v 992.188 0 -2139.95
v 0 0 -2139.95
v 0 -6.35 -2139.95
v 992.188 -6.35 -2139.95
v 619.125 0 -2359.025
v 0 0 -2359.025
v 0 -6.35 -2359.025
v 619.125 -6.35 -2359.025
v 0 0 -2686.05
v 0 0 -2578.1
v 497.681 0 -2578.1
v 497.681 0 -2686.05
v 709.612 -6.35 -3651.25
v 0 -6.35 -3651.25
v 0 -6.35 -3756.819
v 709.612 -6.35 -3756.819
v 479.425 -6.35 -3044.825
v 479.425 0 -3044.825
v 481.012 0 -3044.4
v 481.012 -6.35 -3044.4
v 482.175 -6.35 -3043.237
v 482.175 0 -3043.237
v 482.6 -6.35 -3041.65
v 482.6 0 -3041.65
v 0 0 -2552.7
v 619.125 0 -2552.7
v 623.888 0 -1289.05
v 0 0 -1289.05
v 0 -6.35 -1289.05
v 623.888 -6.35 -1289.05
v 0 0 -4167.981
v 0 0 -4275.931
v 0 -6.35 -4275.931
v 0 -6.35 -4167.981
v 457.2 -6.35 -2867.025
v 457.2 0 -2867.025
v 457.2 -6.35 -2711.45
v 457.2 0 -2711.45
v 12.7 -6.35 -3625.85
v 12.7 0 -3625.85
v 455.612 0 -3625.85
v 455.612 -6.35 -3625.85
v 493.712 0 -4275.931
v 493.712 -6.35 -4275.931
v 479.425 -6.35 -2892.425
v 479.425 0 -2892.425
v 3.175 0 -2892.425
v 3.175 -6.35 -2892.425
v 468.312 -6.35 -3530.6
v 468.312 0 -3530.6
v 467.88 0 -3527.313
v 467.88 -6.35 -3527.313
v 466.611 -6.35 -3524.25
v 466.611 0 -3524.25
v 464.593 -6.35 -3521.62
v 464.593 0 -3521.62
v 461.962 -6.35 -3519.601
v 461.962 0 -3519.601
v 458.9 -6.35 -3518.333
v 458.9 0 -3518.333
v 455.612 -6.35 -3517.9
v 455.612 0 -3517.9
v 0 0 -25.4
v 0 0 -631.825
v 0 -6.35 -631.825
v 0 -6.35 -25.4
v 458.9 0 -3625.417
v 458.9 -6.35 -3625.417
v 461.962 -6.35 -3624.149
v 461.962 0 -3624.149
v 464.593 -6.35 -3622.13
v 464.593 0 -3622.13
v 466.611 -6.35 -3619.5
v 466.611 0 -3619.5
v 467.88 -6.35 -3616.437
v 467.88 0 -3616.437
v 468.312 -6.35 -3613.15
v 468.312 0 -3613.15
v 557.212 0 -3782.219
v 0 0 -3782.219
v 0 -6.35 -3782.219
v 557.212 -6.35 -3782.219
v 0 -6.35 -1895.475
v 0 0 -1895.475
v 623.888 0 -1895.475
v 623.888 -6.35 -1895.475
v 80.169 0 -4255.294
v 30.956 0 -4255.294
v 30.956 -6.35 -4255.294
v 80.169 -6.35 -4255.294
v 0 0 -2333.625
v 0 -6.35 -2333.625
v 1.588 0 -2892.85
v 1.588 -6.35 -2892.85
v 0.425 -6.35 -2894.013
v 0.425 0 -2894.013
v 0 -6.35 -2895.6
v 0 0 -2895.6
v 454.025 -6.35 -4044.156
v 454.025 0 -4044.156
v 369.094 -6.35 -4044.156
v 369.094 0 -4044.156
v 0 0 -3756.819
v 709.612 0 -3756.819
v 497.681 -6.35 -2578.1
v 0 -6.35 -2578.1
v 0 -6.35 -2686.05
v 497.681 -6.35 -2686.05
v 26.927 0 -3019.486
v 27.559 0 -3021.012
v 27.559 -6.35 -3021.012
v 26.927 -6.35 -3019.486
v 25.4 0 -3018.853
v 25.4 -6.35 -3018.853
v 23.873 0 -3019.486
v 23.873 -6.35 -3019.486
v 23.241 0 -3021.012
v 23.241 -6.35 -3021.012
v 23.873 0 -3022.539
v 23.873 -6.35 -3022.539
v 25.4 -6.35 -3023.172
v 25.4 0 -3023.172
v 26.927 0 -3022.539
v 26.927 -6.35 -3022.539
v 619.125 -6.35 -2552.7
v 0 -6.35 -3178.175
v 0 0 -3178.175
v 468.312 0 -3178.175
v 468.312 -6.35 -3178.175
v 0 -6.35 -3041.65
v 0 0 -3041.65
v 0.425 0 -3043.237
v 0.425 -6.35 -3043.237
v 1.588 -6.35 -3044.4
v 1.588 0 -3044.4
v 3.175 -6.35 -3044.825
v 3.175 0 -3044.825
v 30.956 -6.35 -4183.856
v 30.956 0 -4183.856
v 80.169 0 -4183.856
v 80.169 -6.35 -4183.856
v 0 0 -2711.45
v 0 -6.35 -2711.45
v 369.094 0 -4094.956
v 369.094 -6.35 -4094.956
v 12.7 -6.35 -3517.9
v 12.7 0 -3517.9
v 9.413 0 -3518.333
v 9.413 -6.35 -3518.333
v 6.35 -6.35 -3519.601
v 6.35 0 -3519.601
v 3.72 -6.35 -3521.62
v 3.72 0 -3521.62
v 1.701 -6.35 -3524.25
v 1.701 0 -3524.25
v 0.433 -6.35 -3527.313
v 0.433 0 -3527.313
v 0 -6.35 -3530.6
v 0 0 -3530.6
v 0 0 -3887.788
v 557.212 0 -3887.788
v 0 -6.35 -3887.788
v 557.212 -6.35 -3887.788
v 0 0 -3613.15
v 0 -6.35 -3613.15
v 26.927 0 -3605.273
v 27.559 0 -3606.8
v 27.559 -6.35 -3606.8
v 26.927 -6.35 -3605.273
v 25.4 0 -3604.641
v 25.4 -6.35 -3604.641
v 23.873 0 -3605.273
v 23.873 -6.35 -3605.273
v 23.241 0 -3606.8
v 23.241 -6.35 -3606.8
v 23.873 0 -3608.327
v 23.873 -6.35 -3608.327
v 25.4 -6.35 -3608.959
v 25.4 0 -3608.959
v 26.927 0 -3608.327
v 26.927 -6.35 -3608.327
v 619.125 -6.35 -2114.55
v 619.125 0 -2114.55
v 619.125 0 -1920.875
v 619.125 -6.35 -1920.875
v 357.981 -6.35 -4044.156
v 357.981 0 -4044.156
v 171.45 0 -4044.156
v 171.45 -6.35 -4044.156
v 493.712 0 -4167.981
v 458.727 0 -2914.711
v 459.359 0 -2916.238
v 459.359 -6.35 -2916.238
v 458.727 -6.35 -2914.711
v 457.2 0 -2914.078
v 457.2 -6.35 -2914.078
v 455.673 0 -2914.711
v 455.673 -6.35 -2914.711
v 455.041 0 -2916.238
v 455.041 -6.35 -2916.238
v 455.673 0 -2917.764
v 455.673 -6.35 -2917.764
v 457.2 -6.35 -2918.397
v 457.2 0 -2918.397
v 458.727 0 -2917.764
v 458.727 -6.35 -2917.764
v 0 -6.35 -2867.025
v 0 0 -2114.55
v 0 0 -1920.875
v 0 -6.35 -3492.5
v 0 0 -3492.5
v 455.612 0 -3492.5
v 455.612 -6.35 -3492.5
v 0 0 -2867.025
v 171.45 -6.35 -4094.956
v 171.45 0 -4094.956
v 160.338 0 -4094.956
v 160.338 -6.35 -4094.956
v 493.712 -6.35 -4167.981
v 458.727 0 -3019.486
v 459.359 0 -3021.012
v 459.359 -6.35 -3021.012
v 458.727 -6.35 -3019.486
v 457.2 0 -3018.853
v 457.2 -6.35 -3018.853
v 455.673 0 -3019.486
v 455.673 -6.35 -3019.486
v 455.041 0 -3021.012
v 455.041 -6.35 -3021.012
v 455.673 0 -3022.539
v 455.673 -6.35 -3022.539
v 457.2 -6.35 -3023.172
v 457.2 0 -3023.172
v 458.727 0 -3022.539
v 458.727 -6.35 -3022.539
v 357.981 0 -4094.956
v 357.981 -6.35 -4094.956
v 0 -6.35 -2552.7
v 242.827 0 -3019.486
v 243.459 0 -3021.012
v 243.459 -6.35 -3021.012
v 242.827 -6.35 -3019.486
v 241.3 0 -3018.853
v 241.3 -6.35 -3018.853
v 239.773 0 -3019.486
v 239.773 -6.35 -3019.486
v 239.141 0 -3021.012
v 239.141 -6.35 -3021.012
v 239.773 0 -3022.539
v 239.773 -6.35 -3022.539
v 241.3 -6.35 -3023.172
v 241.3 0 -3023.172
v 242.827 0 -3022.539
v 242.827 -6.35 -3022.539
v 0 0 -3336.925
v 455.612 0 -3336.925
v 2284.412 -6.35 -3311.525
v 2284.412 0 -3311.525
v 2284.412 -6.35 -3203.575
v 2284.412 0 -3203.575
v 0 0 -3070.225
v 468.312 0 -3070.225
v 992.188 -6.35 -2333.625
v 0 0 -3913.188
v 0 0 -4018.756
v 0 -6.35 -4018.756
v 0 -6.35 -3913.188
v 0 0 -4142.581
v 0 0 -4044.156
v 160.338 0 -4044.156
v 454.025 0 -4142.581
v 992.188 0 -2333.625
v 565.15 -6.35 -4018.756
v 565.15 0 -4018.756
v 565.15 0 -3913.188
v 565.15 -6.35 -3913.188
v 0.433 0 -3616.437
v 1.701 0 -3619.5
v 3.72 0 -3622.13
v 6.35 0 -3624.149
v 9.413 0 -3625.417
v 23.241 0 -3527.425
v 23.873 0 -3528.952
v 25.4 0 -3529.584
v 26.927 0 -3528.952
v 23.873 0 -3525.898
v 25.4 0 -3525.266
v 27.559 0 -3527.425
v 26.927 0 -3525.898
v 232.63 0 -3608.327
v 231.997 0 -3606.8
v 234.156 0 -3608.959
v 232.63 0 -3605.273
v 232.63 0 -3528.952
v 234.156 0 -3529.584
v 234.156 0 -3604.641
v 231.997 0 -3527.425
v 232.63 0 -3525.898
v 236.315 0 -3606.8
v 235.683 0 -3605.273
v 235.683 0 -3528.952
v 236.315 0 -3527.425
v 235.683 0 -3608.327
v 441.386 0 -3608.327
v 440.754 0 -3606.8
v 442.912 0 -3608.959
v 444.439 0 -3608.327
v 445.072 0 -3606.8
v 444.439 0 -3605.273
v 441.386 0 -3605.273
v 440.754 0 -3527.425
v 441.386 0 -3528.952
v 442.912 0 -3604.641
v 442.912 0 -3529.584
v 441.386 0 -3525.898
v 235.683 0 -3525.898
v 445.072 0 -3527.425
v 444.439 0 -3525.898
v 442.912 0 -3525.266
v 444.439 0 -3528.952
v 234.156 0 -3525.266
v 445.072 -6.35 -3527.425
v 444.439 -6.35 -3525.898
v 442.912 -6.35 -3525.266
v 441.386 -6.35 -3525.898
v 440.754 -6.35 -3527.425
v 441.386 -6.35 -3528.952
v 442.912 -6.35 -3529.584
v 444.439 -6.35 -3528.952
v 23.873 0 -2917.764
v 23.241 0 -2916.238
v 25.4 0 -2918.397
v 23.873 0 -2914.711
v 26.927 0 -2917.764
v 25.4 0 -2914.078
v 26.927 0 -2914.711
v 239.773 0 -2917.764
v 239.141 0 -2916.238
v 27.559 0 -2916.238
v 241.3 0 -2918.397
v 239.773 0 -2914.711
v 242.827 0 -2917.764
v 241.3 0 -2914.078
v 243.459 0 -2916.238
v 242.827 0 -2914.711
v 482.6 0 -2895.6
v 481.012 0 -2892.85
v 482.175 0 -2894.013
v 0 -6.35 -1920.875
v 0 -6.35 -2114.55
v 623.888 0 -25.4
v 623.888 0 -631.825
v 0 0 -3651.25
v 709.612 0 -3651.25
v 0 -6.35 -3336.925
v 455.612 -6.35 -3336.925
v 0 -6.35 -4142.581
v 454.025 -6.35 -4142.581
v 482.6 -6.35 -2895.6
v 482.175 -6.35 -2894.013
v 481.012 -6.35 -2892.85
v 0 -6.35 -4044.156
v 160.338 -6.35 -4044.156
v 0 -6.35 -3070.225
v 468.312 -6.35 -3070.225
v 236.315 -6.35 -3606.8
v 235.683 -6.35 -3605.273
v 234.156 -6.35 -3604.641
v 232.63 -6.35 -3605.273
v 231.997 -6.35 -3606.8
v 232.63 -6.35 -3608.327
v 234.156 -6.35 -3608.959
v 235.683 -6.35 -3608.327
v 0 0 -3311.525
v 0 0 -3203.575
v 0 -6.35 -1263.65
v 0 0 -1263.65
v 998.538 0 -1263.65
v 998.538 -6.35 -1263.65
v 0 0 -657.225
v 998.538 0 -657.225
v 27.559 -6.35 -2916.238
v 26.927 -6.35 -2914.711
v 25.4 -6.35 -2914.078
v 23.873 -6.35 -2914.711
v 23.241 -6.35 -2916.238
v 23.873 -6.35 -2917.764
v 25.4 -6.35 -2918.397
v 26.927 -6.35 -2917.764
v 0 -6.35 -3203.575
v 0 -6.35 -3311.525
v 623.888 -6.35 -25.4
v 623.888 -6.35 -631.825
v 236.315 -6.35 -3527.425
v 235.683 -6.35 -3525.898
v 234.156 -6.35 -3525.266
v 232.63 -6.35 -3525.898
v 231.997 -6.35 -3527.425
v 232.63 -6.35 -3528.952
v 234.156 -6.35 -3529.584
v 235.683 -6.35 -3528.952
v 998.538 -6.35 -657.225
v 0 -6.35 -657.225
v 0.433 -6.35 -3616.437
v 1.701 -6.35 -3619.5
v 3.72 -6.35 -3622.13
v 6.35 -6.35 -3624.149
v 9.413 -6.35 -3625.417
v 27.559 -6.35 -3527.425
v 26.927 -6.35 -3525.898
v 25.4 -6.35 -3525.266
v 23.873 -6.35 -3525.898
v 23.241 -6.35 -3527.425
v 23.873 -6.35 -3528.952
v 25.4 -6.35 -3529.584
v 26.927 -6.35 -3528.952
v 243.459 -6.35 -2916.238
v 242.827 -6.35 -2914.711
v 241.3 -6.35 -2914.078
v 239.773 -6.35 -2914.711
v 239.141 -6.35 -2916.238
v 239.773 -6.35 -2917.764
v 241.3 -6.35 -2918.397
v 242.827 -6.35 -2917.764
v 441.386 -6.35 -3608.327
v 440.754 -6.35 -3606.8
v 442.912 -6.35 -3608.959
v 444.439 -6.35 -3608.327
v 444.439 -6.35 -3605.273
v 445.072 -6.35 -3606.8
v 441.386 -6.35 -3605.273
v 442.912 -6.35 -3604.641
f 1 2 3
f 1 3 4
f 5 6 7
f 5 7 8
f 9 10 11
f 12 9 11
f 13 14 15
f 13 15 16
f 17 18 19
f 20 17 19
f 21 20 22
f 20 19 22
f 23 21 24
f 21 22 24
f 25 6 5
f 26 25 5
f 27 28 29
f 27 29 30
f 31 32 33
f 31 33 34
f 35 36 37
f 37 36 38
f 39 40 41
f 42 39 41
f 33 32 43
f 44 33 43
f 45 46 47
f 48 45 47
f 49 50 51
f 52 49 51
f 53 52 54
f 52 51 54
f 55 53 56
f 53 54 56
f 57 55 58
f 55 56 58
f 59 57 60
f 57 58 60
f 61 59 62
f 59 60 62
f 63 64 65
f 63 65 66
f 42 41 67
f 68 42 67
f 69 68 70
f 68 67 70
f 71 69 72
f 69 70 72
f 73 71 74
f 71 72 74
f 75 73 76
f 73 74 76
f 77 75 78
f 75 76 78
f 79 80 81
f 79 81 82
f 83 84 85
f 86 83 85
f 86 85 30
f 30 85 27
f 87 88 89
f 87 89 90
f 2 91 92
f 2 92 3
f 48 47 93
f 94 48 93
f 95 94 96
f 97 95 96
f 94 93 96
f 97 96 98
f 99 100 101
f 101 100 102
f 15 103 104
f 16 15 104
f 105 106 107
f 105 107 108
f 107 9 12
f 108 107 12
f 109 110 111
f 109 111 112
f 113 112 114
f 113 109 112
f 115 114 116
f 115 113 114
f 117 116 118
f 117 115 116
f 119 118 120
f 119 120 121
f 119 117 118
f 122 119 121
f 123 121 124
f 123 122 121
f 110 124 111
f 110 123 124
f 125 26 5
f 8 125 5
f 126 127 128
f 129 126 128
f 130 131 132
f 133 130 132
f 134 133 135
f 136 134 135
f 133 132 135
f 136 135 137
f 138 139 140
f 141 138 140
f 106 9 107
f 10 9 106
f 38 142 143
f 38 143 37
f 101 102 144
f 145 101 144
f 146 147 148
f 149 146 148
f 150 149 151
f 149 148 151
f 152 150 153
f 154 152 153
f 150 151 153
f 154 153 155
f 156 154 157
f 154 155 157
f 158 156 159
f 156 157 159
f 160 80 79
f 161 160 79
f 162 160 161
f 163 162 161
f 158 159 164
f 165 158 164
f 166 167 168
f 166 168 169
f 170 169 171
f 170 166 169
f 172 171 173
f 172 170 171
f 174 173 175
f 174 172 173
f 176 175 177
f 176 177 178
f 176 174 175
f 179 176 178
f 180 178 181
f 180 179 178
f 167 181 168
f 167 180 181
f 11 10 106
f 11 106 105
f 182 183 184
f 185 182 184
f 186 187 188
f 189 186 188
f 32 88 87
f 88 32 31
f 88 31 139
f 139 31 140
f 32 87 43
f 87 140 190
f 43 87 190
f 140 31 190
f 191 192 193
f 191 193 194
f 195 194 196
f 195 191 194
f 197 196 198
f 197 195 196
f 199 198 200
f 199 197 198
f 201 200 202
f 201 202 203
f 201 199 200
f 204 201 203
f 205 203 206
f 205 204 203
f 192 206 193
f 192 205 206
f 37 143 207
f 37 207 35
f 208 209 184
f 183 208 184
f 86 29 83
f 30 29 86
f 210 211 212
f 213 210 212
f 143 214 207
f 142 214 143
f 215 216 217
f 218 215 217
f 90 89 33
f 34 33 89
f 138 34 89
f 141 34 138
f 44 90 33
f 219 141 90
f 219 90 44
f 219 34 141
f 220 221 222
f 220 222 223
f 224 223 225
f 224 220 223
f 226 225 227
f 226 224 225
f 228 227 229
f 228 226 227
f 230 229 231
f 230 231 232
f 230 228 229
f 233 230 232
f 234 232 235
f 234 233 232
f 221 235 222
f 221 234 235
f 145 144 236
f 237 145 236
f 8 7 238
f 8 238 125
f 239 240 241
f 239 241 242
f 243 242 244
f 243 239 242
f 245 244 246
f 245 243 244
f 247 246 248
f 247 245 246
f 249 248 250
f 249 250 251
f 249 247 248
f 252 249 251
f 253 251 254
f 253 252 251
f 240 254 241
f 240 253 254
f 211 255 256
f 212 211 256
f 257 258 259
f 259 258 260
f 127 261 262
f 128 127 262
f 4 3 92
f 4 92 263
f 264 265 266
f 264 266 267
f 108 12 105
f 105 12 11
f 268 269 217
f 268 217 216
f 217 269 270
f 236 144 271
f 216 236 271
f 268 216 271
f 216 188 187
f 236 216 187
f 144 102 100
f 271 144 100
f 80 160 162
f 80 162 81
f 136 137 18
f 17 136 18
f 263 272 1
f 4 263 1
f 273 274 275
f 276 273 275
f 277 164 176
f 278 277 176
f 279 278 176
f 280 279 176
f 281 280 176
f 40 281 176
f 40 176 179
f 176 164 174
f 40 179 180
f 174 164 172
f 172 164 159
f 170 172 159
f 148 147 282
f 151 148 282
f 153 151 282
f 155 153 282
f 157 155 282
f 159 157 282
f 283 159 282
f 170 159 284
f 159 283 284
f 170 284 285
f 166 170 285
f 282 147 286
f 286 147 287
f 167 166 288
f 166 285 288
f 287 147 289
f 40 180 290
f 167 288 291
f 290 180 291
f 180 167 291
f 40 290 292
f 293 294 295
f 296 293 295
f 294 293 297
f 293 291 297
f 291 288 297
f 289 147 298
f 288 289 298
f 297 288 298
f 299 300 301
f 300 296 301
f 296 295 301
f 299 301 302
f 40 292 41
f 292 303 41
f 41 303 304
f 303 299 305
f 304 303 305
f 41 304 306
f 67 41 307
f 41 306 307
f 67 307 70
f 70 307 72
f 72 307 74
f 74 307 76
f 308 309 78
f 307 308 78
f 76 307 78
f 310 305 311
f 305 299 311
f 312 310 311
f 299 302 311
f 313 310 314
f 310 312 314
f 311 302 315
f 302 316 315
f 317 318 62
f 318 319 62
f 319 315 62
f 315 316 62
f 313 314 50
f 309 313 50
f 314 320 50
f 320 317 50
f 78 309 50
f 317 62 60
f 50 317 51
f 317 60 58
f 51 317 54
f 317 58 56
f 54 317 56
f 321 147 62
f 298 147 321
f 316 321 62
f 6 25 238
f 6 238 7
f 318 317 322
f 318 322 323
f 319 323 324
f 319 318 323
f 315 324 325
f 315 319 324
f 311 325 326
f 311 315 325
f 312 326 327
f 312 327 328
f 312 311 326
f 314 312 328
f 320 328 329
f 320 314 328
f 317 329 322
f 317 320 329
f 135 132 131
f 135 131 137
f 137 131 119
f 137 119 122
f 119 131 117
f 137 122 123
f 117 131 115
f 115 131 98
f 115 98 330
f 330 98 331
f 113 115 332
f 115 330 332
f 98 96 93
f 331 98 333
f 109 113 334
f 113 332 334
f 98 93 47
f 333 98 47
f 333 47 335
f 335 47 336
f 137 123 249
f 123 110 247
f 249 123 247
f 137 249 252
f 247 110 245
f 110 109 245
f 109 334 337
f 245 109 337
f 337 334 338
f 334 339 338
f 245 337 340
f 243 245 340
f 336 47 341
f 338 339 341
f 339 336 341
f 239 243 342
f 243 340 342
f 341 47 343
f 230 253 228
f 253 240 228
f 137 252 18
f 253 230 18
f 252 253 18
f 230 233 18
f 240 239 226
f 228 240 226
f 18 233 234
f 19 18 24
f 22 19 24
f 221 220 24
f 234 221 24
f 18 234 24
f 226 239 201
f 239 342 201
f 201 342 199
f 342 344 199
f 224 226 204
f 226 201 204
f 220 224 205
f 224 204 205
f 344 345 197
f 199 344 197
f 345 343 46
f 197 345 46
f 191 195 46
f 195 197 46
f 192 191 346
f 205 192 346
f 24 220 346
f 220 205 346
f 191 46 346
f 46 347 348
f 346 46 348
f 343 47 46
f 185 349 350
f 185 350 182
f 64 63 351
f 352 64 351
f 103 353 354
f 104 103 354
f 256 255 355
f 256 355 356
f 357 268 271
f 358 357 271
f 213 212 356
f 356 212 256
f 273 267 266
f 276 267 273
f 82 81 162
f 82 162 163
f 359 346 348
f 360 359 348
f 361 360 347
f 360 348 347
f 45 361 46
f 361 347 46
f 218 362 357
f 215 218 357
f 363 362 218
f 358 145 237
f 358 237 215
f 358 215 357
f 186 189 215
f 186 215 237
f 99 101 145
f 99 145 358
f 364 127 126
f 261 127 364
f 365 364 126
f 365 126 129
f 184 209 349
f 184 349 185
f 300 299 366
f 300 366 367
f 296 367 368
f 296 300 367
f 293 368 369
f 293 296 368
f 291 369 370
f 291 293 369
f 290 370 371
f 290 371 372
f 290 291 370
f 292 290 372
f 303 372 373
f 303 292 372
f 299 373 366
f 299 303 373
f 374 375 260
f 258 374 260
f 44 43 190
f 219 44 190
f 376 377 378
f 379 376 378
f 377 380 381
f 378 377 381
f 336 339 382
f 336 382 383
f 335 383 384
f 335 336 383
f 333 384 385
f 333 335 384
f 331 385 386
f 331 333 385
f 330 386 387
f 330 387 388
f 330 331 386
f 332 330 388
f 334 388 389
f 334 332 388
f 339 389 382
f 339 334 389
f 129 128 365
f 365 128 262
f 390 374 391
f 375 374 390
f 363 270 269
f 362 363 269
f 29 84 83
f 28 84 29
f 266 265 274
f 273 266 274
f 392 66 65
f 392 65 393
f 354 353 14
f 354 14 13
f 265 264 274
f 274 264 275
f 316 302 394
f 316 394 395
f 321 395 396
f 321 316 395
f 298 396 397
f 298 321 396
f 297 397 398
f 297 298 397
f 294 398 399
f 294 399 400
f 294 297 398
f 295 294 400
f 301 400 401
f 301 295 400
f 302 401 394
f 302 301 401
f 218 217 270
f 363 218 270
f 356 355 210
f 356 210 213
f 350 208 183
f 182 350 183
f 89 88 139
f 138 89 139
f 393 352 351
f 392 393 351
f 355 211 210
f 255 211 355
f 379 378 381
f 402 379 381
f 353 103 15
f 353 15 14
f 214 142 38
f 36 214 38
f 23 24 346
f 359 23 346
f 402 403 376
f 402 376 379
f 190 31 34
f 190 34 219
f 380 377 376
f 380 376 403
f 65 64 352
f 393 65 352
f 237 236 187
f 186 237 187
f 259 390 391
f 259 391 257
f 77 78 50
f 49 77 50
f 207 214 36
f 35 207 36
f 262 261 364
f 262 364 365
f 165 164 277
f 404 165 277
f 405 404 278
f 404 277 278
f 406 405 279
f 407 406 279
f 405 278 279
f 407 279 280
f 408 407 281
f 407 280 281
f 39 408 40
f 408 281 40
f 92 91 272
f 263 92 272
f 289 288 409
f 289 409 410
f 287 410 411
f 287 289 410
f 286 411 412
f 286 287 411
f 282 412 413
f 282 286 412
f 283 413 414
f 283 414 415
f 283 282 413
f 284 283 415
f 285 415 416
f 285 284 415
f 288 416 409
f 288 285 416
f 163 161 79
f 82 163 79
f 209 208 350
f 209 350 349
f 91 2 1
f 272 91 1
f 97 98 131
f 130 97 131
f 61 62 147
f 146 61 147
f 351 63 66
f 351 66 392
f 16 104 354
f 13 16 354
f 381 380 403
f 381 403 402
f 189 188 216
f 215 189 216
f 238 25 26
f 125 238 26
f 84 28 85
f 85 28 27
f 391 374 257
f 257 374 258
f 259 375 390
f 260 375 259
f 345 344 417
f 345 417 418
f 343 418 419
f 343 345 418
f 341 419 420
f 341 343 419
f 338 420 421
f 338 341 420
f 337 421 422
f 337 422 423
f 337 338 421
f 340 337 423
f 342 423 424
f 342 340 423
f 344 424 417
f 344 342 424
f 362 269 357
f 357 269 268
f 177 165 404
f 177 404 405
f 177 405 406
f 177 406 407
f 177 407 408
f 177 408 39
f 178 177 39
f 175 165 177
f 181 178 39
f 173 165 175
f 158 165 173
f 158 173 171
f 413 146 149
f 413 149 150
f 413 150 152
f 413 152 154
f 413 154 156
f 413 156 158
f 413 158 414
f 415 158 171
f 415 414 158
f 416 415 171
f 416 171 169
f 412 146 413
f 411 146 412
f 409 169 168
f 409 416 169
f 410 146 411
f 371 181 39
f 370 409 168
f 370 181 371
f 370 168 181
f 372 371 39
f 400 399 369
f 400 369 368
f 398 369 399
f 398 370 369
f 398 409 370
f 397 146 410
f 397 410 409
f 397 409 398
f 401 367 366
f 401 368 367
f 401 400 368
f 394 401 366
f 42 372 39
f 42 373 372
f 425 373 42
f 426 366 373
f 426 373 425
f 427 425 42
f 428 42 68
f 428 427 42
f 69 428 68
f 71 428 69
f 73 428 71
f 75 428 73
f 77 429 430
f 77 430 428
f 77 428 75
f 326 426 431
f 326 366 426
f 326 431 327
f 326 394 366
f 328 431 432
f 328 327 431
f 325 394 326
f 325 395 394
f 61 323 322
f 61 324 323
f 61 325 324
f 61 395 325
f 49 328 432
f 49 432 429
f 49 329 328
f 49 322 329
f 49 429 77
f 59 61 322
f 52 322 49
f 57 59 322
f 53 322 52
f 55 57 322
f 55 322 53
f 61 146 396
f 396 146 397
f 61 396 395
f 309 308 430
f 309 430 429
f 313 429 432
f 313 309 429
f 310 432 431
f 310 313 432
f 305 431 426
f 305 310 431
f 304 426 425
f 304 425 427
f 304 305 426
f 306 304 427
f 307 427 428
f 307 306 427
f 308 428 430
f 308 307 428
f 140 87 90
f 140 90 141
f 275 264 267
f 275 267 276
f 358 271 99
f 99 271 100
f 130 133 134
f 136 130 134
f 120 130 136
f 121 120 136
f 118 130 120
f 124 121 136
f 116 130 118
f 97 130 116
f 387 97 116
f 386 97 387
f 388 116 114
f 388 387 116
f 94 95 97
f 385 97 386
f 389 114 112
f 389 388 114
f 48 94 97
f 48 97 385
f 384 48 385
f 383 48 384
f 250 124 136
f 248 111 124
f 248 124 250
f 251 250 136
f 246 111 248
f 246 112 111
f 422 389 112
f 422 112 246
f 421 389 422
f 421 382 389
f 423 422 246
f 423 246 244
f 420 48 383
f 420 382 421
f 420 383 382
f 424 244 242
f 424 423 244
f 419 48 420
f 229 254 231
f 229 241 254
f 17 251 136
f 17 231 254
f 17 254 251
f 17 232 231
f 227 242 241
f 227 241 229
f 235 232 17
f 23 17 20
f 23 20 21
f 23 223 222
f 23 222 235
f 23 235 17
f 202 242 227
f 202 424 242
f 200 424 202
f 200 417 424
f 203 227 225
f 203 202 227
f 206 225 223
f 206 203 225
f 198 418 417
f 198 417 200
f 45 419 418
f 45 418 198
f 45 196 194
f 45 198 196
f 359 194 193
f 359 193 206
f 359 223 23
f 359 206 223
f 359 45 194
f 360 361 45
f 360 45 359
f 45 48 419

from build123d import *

# Parameters (mm, degrees)
F0_W     = 623.8875
F0_H     = 606.425
F0_W_2   = 998.5375
F0_W_3   = 619.125
F0_H_2   = 193.675
F0_W_4   = 992.1875
F0_W_5   = 497.68125
F0_H_3   = 107.95
F0_W_6   = 457.2
F0_H_4   = 155.575
F0_R     = 2.159
F0_W_7   = 468.3125
F0_W_8   = 2284.4125
F0_W_9   = 455.6125
F0_W_10  = 709.6125
F0_H_5   = 105.56875
F0_W_11  = 557.2125
F0_W_12  = 565.15
F0_W_13  = 493.7125
F0_W_14  = 49.2125
F0_H_6   = 71.4375
F1_DEPTH = 6.35


with BuildPart() as f1:
    # F0 (on Front) → F1 (new body)
    with BuildSketch(Plane.XZ):
        with Locations((311.94375, -328.6125)):
            Rectangle(F0_W, F0_H)
        with Locations((499.26875, -960.4375)):
            Rectangle(F0_W_2, F0_H)
        with Locations((311.94375, -1592.2625)):
            Rectangle(F0_W, F0_H)
        with Locations((309.5625, -2017.7125)):
            Rectangle(F0_W_3, F0_H_2)
        with Locations((496.09375, -2236.7875)):
            Rectangle(F0_W_4, F0_H_2)
        with Locations((309.5625, -2455.8625)):
            Rectangle(F0_W_3, F0_H_2)
        with Locations((248.840625, -2632.075)):
            Rectangle(F0_W_5, F0_H_3)
        with Locations((228.6, -2789.2375)):
            Rectangle(F0_W_6, F0_H_4)
        with BuildLine():
            Line((479.425, -2892.425), (3.175, -2892.425))
            ThreePointArc((3.175, -2892.425), (0.929936, -2893.354936), (0, -2895.6))
            Line((0, -2895.6), (0, -3041.65))
            ThreePointArc((0, -3041.65), (0.929936, -3043.895064), (3.175, -3044.825))
            Line((3.175, -3044.825), (479.425, -3044.825))
            ThreePointArc((479.425, -3044.825), (481.670064, -3043.895064), (482.6, -3041.65))
            Line((482.6, -3041.65), (482.6, -2895.6))
            ThreePointArc((482.6, -2895.6), (481.670064, -2893.354936), (479.425, -2892.425))
        make_face()
        with Locations((25.4, -3021.0125)):
            Circle(F0_R, mode=Mode.SUBTRACT)
        with Locations((241.3, -3021.0125)):
            Circle(F0_R, mode=Mode.SUBTRACT)
        with Locations((25.4, -2916.2375)):
            Circle(F0_R, mode=Mode.SUBTRACT)
        with Locations((241.3, -2916.2375)):
            Circle(F0_R, mode=Mode.SUBTRACT)
        with Locations((457.2, -3021.0125)):
            Circle(F0_R, mode=Mode.SUBTRACT)
        with Locations((457.2, -2916.2375)):
            Circle(F0_R, mode=Mode.SUBTRACT)
        with Locations((234.15625, -3124.2)):
            Rectangle(F0_W_7, F0_H_3)
        with Locations((1142.20625, -3257.55)):
            Rectangle(F0_W_8, F0_H_3)
        with Locations((227.80625, -3414.7125)):
            Rectangle(F0_W_9, F0_H_4)
        with BuildLine():
            Line((455.6125, -3517.9), (12.7, -3517.9))
            ThreePointArc((12.7, -3517.9), (3.719744, -3521.619744), (0, -3530.6))
            Line((0, -3530.6), (0, -3613.15))
            ThreePointArc((0, -3613.15), (3.719744, -3622.130256), (12.7, -3625.85))
            Line((12.7, -3625.85), (455.6125, -3625.85))
            ThreePointArc((455.6125, -3625.85), (464.592756, -3622.130256), (468.3125, -3613.15))
            Line((468.3125, -3613.15), (468.3125, -3530.6))
            ThreePointArc((468.3125, -3530.6), (464.592756, -3521.619744), (455.6125, -3517.9))
        make_face()
        with Locations((25.4, -3606.8)):
            Circle(F0_R, mode=Mode.SUBTRACT)
        with Locations((25.4, -3527.425)):
            Circle(F0_R, mode=Mode.SUBTRACT)
        with Locations((234.15625, -3606.8)):
            Circle(F0_R, mode=Mode.SUBTRACT)
        with Locations((234.15625, -3527.425)):
            Circle(F0_R, mode=Mode.SUBTRACT)
        with Locations((442.9125, -3606.8)):
            Circle(F0_R, mode=Mode.SUBTRACT)
        with Locations((442.9125, -3527.425)):
            Circle(F0_R, mode=Mode.SUBTRACT)
        with Locations((354.80625, -3704.034375)):
            Rectangle(F0_W_10, F0_H_5)
        with Locations((278.60625, -3835.003125)):
            Rectangle(F0_W_11, F0_H_5)
        with Locations((282.575, -3965.971875)):
            Rectangle(F0_W_12, F0_H_5)
        Polygon((160.3375, -4044.15625), (0, -4044.15625), (0, -4142.58125), (454.025, -4142.58125), (454.025, -4044.15625), (369.09375, -4044.15625), (369.09375, -4094.95625), (357.98125, -4094.95625), (357.98125, -4044.15625), (171.45, -4044.15625), (171.45, -4094.95625), (160.3375, -4094.95625), align=None)
        with Locations((246.85625, -4221.95625)):
            Rectangle(F0_W_13, F0_H_3)
        with Locations((55.5625, -4219.575)):
            Rectangle(F0_W_14, F0_H_6, mode=Mode.SUBTRACT)
    extrude(amount=F1_DEPTH)


solid = f1.part
